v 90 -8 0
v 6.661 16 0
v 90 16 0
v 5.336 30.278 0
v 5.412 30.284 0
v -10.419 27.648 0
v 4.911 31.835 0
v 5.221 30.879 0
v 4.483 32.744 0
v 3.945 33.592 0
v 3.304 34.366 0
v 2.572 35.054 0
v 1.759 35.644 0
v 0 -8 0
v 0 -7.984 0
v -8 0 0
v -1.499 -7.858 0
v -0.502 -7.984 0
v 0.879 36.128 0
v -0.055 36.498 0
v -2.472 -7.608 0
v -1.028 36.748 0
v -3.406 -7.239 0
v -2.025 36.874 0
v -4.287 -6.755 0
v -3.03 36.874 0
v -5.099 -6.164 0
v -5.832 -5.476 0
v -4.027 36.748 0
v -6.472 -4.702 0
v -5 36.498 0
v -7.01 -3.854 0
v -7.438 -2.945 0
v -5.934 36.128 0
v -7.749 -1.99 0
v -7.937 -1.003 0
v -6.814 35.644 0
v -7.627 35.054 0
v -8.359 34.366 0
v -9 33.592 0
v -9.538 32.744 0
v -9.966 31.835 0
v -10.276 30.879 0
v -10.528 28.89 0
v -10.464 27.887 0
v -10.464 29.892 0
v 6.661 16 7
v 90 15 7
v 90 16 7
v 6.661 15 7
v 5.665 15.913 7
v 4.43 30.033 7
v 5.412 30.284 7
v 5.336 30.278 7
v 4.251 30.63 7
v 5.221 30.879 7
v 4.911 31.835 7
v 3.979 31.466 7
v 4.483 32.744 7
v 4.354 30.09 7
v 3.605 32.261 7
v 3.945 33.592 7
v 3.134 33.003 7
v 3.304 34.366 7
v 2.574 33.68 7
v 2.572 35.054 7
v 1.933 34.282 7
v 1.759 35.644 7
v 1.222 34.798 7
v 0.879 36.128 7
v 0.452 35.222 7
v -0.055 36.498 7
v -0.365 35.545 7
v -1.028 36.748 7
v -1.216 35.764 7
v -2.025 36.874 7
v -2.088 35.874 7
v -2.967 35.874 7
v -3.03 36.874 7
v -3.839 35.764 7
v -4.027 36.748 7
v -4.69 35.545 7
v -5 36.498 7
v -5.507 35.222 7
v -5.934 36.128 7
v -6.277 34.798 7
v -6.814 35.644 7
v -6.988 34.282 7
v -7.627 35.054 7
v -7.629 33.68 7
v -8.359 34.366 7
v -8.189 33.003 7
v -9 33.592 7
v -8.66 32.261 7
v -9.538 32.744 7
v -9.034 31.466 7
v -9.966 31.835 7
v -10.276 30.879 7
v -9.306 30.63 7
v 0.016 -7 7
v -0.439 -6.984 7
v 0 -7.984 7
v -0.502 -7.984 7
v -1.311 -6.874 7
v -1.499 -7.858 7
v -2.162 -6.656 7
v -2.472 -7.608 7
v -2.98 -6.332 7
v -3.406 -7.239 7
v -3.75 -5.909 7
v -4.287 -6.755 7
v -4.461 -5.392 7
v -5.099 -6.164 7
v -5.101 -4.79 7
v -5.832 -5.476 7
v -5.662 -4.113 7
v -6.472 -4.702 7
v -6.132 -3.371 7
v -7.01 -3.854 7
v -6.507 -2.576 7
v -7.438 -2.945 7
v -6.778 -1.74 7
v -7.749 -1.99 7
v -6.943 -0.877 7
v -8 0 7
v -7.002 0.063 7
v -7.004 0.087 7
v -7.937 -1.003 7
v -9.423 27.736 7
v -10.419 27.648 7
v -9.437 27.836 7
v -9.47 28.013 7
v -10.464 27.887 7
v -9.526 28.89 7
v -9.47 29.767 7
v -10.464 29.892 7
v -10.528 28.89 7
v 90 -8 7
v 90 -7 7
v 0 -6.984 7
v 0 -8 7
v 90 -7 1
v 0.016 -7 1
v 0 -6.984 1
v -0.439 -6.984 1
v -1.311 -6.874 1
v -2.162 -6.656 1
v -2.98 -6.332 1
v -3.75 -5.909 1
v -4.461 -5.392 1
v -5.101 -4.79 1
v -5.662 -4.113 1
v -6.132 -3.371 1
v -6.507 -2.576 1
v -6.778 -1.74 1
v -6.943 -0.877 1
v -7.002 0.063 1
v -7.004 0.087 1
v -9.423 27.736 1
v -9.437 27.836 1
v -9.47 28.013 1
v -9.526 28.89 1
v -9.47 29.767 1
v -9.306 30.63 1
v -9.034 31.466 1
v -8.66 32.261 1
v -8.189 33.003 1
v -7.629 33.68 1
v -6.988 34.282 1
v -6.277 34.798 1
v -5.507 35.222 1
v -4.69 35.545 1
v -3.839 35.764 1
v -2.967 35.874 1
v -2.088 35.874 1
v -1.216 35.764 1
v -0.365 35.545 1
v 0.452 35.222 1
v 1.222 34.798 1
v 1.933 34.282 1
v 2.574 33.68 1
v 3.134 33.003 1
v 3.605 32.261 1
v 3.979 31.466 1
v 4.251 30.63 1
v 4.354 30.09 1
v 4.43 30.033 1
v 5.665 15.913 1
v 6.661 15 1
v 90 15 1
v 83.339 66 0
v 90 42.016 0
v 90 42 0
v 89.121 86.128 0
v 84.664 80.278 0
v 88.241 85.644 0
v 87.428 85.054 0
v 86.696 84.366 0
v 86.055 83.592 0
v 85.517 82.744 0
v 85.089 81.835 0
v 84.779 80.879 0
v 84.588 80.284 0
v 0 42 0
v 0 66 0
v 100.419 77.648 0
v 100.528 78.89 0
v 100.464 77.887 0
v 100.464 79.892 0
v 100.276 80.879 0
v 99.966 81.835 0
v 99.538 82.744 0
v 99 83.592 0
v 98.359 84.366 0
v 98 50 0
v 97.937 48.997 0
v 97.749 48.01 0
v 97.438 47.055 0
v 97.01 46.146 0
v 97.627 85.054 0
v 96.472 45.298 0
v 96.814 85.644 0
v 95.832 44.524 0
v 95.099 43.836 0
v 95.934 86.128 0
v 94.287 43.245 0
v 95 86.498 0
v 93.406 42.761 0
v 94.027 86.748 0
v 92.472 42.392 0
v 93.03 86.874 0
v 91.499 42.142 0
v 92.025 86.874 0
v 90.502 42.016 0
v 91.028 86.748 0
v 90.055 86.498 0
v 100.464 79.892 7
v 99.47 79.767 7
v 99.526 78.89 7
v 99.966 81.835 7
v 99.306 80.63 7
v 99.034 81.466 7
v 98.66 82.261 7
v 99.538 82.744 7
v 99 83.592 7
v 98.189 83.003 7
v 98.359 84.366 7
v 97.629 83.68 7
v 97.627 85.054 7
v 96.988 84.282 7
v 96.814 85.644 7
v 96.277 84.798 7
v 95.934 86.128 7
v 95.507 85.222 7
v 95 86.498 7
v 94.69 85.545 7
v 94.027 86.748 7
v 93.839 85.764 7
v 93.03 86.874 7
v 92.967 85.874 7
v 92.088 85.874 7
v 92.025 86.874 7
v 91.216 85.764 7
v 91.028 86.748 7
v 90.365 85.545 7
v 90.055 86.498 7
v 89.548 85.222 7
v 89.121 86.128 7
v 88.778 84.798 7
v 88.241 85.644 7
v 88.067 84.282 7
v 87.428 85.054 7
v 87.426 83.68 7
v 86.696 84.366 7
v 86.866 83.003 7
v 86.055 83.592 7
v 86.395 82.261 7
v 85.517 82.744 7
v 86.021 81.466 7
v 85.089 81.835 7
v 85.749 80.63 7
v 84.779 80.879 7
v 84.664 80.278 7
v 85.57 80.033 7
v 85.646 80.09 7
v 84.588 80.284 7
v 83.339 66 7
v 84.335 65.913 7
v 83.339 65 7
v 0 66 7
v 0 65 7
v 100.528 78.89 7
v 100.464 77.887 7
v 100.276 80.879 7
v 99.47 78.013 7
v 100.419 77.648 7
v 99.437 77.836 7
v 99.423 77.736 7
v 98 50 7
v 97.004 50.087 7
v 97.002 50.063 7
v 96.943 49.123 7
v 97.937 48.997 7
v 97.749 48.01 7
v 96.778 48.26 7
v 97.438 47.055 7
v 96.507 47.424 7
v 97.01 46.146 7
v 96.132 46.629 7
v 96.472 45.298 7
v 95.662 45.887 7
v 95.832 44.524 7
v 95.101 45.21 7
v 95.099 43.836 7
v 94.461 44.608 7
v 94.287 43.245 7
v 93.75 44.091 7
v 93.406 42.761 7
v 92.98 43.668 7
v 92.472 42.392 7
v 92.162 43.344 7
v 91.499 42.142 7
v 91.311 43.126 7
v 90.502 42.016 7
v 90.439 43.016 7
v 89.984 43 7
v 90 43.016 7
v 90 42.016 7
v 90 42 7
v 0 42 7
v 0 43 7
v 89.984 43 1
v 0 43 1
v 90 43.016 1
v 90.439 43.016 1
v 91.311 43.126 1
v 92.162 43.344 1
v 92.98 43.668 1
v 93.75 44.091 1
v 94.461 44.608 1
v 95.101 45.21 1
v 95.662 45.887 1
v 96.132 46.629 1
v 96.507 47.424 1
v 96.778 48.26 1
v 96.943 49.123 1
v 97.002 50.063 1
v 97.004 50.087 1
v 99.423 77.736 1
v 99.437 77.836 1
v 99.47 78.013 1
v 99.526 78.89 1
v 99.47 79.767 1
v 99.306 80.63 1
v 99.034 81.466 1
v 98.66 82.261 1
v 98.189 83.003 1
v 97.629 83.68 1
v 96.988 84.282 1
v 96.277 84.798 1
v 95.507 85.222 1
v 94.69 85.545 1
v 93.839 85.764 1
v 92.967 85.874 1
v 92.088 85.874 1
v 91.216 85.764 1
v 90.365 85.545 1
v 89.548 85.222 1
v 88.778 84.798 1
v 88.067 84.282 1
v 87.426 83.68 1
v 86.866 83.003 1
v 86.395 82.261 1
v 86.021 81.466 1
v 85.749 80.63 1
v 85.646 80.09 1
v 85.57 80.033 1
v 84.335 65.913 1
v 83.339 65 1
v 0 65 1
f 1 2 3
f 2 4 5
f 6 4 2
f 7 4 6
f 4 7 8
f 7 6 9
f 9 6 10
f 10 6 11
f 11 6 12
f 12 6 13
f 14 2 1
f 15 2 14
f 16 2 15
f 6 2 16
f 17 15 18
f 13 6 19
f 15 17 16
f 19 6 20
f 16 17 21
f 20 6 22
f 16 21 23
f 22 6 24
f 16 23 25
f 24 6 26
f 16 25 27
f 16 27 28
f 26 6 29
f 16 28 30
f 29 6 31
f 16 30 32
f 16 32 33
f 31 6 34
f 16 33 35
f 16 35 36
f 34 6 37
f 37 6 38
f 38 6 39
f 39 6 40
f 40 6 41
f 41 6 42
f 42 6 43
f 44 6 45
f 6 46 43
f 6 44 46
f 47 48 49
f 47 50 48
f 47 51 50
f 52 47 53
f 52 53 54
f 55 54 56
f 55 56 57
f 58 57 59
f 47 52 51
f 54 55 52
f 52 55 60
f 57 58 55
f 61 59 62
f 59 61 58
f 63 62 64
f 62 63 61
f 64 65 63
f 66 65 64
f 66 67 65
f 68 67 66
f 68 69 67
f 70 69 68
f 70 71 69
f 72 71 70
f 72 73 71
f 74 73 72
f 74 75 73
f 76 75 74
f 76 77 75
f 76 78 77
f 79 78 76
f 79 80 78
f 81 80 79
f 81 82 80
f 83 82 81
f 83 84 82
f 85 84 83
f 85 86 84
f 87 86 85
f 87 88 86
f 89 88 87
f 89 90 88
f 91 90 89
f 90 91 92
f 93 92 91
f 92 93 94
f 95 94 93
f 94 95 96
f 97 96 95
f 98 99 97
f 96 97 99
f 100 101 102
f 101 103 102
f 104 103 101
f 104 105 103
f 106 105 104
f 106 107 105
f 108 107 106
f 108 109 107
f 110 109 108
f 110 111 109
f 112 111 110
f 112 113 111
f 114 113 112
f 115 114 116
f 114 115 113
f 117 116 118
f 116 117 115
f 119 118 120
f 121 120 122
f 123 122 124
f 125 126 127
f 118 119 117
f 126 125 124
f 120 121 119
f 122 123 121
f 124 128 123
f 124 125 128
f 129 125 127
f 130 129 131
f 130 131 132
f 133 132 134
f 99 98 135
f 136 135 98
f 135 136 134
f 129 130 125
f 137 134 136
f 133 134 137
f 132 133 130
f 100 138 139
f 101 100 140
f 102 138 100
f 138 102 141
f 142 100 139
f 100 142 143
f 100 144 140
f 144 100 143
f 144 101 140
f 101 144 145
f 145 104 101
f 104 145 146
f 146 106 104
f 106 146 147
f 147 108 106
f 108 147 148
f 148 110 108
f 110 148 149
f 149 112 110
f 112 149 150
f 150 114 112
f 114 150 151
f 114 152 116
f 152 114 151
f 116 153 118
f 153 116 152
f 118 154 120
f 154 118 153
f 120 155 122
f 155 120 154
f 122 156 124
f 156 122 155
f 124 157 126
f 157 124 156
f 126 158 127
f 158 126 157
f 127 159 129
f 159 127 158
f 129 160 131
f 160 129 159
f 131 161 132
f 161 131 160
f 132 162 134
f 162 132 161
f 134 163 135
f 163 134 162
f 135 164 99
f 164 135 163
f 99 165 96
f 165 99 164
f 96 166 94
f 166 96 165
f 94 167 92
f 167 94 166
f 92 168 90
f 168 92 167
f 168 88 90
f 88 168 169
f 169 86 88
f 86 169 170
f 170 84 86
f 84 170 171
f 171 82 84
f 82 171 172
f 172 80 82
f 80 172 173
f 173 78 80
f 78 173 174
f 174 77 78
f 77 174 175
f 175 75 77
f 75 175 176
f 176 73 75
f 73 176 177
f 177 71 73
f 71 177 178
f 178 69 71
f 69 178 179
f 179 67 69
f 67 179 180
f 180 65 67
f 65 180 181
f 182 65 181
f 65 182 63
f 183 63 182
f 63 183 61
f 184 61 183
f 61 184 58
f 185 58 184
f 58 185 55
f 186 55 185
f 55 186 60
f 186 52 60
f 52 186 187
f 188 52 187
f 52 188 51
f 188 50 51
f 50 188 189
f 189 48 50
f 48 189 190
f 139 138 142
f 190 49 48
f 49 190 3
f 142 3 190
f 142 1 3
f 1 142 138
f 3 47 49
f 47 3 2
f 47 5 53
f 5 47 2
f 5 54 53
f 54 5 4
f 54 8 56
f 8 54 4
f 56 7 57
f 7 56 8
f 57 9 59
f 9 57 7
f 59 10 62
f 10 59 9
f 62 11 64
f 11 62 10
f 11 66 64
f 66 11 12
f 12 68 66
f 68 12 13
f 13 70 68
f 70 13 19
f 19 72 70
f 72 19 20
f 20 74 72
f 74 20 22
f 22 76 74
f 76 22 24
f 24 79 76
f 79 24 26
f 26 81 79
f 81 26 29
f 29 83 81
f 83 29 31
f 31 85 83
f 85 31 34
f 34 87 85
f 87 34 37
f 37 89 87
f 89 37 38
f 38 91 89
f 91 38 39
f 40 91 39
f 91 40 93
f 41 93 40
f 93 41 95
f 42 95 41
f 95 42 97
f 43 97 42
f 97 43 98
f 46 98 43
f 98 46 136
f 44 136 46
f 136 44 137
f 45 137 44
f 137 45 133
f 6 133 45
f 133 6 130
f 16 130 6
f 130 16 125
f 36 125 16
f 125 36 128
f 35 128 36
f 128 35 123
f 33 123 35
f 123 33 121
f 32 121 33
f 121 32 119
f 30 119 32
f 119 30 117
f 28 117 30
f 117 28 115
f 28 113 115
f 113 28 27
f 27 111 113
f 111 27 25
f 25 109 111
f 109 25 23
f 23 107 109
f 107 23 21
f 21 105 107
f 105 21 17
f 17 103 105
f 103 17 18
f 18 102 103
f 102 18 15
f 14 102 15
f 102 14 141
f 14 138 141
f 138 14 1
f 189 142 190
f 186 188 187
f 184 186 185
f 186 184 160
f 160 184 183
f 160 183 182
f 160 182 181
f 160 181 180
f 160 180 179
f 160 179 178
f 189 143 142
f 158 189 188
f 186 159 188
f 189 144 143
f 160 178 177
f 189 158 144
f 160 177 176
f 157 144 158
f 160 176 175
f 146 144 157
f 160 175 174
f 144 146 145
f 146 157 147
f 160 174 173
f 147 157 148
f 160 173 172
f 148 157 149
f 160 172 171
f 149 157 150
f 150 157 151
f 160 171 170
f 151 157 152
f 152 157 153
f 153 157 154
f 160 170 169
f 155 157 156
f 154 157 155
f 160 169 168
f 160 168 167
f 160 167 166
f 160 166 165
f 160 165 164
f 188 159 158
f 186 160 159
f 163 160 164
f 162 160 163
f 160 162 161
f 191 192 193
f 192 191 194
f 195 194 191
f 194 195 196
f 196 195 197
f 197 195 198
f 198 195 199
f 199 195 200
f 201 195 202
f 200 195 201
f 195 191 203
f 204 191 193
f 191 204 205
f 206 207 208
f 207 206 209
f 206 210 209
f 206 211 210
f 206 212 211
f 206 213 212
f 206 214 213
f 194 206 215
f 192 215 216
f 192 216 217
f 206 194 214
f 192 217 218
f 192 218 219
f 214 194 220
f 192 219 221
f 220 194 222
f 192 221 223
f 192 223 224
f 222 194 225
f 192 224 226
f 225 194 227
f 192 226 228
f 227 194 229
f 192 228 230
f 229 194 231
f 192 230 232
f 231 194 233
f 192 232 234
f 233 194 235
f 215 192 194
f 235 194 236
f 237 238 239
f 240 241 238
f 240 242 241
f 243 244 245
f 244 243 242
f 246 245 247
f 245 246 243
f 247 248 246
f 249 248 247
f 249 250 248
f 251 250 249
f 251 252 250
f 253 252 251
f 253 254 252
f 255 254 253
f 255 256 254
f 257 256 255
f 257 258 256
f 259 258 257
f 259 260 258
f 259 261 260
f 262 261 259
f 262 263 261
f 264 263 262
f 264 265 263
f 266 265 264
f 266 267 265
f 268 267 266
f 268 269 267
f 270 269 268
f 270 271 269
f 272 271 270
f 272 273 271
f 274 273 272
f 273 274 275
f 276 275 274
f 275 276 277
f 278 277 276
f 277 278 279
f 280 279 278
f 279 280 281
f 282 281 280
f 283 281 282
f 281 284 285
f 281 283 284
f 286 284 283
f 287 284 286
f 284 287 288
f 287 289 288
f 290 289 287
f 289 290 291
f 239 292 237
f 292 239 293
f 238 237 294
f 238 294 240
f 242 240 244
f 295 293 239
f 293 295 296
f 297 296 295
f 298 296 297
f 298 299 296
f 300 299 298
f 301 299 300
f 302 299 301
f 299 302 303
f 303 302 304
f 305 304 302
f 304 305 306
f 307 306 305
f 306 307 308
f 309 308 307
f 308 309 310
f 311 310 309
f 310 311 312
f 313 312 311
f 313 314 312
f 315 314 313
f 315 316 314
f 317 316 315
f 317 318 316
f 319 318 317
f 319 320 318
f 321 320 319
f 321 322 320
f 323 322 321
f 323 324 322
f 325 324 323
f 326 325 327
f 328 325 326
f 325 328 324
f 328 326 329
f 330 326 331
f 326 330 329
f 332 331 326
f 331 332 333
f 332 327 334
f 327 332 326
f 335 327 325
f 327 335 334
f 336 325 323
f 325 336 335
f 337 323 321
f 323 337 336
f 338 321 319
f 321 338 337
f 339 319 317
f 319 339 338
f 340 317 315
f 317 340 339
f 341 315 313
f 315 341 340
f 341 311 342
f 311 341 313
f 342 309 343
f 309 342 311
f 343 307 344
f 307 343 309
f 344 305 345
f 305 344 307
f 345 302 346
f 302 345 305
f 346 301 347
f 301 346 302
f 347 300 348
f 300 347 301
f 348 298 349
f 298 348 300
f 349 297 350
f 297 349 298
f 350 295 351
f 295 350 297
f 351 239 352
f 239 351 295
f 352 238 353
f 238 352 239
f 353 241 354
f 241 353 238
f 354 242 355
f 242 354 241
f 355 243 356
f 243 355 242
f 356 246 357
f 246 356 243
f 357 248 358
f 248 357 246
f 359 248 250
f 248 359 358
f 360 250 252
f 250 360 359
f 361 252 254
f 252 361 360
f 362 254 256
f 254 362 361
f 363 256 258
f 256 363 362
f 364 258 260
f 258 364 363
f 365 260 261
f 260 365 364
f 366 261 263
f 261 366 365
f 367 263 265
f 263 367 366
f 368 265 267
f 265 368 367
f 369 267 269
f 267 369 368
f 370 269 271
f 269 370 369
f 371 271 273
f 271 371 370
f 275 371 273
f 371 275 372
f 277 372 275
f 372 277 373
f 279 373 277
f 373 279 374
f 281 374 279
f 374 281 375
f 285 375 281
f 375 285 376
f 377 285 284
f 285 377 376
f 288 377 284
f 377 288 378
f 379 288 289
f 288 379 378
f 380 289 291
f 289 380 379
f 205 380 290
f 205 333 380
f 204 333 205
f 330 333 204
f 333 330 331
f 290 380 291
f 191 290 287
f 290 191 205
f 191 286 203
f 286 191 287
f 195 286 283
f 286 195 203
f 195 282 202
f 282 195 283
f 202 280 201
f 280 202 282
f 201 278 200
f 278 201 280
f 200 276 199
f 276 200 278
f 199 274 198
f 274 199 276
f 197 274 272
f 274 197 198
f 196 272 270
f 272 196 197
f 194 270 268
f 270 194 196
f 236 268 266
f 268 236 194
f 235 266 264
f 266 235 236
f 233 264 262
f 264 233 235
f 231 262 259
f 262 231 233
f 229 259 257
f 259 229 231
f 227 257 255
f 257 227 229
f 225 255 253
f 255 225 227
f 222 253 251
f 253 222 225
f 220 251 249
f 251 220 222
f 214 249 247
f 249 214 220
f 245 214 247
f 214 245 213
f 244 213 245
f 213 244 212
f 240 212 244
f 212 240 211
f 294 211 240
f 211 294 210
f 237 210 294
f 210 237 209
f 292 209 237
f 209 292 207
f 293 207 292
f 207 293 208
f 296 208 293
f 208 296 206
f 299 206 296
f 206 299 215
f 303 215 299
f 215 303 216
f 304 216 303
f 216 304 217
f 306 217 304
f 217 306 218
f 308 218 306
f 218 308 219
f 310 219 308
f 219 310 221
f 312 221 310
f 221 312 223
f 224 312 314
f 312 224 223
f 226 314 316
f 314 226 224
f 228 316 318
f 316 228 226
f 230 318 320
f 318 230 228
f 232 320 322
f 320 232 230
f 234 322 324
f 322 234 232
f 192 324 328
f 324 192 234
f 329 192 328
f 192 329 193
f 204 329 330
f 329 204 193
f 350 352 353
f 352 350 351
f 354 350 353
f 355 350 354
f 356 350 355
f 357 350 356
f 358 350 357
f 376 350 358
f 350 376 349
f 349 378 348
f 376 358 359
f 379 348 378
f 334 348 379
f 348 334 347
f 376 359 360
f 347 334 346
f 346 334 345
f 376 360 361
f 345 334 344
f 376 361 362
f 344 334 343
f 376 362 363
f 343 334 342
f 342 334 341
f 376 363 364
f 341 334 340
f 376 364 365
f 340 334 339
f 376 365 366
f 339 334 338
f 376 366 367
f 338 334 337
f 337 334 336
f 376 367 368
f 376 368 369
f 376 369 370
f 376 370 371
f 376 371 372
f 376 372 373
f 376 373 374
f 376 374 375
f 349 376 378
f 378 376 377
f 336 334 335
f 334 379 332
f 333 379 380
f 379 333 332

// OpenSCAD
/*----------------------------------------------------------------------------*/
/*-------                         INFORMATIONS                        --------*/
/*----------------------------------------------------------------------------*/
/*----------------------------------------------------------------------------*/

// CUSTOMIZABLE WINDOW SILL END CAPS (parametric left and right side)
// by Maxim Agapov, August 2018

/*----------------------------------------------------------------------------*/
/*-------                           SETTINGS                          --------*/
/*----------------------------------------------------------------------------*/
a = 24; // размер широкой части // wide part size
b = 16; // размер узкой части // narrow part size
y = 5; //угол наклона 0 или 5 градусов // angle of inclination (0 or 5 degrees)
L1 = 90; // длина широкой части // length of wide part
L2 = 45; // длина узкой части // length of the narrow part
h = 7; // высота бортика // height of the rim
q = "Both"; // Left, Right, if any other value - then both left and right
t = 1; // толщина бортика // thickness of the rim
t1 = 1; // толщина торцевой части // thickness of the butt end
/*----------------------------------------------------------------------------*/
/*-------                             CODE                            --------*/
/*----------------------------------------------------------------------------*/

/*____________________________________________________________________________*/
/* [HIDDEN] */
c = b/2; // радиус скругления // fillet radius
module Telo(a,b,y,c,L1,L2){
union(){
circle(c, $fn=50);
translate ([0,-c,0]) square([L1,a]);
translate ([-c,0,0]) rotate (y,0,0) square ([b,L2-c-b/2]);
translate ([(L2-b)*cos(90+y),(L2-b)*sin(90-y),0]) circle (b/2,b/2, $fn=50);
}
}

module Itog(){
    union(){
    linear_extrude(h) {
difference(){
    offset(r = 0) {
    Telo(a,b,y,c,L1,L2);
    }
    offset(r = -t) {
    Telo(a,b,y,c,L1*1.2,L2);
    }
       }
}
linear_extrude(t1) {
Telo(a,b,y,c,L1,L2);
}
}
}

if (q == "Right") Itog();
else {
if (q == "Left") mirror([1,0,0]) Itog();
else {
Itog();
mirror([1,0,0])
translate ([-L1,L2+5,0]) Itog();
}
}
